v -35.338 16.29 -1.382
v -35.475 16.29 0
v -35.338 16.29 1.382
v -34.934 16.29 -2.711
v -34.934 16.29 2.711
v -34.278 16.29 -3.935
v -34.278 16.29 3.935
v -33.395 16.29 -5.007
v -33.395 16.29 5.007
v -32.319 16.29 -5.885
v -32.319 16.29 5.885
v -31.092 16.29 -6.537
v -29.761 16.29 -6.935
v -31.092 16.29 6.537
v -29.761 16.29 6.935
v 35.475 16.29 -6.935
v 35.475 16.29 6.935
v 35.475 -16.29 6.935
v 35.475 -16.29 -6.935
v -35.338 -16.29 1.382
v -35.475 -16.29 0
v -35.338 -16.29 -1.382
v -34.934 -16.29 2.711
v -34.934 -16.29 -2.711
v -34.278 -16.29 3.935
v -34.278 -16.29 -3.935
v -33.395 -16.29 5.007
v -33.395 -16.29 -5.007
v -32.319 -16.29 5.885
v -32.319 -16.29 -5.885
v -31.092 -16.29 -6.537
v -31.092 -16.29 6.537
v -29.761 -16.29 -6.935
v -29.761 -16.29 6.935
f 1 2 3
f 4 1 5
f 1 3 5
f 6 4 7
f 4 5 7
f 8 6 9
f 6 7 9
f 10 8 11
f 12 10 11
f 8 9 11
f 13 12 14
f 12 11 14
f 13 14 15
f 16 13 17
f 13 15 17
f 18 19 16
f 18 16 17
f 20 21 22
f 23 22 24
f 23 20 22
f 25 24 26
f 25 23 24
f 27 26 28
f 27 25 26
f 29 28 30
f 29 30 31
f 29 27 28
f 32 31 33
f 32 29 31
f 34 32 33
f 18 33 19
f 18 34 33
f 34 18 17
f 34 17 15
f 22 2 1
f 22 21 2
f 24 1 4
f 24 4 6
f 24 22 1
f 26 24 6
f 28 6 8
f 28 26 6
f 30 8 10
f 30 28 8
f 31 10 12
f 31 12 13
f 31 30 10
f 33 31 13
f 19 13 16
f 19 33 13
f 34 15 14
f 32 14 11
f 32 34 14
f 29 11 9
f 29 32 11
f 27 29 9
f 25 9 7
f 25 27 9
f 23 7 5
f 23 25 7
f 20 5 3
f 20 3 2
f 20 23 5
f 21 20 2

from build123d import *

# Parameters (mm, degrees)
F1_DEPTH = 16.29


with BuildPart() as f1:
    # F0 (on Front) → F1 (new body, symmetric)
    with BuildSketch(Plane.XZ):
        with BuildLine():
            Line((-29.761402, -6.935), (35.475, -6.935))
            Line((35.475, -6.935), (35.475, 6.935))
            Line((35.475, 6.935), (-29.761402, 6.935))
            ThreePointArc((-29.761402, 6.935), (-33.862627, 4.492756), (-35.475, 0))
            ThreePointArc((-35.475, 0), (-33.862627, -4.492756), (-29.761402, -6.935))
        make_face()
    extrude(amount=F1_DEPTH, both=True)


solid = f1.part
